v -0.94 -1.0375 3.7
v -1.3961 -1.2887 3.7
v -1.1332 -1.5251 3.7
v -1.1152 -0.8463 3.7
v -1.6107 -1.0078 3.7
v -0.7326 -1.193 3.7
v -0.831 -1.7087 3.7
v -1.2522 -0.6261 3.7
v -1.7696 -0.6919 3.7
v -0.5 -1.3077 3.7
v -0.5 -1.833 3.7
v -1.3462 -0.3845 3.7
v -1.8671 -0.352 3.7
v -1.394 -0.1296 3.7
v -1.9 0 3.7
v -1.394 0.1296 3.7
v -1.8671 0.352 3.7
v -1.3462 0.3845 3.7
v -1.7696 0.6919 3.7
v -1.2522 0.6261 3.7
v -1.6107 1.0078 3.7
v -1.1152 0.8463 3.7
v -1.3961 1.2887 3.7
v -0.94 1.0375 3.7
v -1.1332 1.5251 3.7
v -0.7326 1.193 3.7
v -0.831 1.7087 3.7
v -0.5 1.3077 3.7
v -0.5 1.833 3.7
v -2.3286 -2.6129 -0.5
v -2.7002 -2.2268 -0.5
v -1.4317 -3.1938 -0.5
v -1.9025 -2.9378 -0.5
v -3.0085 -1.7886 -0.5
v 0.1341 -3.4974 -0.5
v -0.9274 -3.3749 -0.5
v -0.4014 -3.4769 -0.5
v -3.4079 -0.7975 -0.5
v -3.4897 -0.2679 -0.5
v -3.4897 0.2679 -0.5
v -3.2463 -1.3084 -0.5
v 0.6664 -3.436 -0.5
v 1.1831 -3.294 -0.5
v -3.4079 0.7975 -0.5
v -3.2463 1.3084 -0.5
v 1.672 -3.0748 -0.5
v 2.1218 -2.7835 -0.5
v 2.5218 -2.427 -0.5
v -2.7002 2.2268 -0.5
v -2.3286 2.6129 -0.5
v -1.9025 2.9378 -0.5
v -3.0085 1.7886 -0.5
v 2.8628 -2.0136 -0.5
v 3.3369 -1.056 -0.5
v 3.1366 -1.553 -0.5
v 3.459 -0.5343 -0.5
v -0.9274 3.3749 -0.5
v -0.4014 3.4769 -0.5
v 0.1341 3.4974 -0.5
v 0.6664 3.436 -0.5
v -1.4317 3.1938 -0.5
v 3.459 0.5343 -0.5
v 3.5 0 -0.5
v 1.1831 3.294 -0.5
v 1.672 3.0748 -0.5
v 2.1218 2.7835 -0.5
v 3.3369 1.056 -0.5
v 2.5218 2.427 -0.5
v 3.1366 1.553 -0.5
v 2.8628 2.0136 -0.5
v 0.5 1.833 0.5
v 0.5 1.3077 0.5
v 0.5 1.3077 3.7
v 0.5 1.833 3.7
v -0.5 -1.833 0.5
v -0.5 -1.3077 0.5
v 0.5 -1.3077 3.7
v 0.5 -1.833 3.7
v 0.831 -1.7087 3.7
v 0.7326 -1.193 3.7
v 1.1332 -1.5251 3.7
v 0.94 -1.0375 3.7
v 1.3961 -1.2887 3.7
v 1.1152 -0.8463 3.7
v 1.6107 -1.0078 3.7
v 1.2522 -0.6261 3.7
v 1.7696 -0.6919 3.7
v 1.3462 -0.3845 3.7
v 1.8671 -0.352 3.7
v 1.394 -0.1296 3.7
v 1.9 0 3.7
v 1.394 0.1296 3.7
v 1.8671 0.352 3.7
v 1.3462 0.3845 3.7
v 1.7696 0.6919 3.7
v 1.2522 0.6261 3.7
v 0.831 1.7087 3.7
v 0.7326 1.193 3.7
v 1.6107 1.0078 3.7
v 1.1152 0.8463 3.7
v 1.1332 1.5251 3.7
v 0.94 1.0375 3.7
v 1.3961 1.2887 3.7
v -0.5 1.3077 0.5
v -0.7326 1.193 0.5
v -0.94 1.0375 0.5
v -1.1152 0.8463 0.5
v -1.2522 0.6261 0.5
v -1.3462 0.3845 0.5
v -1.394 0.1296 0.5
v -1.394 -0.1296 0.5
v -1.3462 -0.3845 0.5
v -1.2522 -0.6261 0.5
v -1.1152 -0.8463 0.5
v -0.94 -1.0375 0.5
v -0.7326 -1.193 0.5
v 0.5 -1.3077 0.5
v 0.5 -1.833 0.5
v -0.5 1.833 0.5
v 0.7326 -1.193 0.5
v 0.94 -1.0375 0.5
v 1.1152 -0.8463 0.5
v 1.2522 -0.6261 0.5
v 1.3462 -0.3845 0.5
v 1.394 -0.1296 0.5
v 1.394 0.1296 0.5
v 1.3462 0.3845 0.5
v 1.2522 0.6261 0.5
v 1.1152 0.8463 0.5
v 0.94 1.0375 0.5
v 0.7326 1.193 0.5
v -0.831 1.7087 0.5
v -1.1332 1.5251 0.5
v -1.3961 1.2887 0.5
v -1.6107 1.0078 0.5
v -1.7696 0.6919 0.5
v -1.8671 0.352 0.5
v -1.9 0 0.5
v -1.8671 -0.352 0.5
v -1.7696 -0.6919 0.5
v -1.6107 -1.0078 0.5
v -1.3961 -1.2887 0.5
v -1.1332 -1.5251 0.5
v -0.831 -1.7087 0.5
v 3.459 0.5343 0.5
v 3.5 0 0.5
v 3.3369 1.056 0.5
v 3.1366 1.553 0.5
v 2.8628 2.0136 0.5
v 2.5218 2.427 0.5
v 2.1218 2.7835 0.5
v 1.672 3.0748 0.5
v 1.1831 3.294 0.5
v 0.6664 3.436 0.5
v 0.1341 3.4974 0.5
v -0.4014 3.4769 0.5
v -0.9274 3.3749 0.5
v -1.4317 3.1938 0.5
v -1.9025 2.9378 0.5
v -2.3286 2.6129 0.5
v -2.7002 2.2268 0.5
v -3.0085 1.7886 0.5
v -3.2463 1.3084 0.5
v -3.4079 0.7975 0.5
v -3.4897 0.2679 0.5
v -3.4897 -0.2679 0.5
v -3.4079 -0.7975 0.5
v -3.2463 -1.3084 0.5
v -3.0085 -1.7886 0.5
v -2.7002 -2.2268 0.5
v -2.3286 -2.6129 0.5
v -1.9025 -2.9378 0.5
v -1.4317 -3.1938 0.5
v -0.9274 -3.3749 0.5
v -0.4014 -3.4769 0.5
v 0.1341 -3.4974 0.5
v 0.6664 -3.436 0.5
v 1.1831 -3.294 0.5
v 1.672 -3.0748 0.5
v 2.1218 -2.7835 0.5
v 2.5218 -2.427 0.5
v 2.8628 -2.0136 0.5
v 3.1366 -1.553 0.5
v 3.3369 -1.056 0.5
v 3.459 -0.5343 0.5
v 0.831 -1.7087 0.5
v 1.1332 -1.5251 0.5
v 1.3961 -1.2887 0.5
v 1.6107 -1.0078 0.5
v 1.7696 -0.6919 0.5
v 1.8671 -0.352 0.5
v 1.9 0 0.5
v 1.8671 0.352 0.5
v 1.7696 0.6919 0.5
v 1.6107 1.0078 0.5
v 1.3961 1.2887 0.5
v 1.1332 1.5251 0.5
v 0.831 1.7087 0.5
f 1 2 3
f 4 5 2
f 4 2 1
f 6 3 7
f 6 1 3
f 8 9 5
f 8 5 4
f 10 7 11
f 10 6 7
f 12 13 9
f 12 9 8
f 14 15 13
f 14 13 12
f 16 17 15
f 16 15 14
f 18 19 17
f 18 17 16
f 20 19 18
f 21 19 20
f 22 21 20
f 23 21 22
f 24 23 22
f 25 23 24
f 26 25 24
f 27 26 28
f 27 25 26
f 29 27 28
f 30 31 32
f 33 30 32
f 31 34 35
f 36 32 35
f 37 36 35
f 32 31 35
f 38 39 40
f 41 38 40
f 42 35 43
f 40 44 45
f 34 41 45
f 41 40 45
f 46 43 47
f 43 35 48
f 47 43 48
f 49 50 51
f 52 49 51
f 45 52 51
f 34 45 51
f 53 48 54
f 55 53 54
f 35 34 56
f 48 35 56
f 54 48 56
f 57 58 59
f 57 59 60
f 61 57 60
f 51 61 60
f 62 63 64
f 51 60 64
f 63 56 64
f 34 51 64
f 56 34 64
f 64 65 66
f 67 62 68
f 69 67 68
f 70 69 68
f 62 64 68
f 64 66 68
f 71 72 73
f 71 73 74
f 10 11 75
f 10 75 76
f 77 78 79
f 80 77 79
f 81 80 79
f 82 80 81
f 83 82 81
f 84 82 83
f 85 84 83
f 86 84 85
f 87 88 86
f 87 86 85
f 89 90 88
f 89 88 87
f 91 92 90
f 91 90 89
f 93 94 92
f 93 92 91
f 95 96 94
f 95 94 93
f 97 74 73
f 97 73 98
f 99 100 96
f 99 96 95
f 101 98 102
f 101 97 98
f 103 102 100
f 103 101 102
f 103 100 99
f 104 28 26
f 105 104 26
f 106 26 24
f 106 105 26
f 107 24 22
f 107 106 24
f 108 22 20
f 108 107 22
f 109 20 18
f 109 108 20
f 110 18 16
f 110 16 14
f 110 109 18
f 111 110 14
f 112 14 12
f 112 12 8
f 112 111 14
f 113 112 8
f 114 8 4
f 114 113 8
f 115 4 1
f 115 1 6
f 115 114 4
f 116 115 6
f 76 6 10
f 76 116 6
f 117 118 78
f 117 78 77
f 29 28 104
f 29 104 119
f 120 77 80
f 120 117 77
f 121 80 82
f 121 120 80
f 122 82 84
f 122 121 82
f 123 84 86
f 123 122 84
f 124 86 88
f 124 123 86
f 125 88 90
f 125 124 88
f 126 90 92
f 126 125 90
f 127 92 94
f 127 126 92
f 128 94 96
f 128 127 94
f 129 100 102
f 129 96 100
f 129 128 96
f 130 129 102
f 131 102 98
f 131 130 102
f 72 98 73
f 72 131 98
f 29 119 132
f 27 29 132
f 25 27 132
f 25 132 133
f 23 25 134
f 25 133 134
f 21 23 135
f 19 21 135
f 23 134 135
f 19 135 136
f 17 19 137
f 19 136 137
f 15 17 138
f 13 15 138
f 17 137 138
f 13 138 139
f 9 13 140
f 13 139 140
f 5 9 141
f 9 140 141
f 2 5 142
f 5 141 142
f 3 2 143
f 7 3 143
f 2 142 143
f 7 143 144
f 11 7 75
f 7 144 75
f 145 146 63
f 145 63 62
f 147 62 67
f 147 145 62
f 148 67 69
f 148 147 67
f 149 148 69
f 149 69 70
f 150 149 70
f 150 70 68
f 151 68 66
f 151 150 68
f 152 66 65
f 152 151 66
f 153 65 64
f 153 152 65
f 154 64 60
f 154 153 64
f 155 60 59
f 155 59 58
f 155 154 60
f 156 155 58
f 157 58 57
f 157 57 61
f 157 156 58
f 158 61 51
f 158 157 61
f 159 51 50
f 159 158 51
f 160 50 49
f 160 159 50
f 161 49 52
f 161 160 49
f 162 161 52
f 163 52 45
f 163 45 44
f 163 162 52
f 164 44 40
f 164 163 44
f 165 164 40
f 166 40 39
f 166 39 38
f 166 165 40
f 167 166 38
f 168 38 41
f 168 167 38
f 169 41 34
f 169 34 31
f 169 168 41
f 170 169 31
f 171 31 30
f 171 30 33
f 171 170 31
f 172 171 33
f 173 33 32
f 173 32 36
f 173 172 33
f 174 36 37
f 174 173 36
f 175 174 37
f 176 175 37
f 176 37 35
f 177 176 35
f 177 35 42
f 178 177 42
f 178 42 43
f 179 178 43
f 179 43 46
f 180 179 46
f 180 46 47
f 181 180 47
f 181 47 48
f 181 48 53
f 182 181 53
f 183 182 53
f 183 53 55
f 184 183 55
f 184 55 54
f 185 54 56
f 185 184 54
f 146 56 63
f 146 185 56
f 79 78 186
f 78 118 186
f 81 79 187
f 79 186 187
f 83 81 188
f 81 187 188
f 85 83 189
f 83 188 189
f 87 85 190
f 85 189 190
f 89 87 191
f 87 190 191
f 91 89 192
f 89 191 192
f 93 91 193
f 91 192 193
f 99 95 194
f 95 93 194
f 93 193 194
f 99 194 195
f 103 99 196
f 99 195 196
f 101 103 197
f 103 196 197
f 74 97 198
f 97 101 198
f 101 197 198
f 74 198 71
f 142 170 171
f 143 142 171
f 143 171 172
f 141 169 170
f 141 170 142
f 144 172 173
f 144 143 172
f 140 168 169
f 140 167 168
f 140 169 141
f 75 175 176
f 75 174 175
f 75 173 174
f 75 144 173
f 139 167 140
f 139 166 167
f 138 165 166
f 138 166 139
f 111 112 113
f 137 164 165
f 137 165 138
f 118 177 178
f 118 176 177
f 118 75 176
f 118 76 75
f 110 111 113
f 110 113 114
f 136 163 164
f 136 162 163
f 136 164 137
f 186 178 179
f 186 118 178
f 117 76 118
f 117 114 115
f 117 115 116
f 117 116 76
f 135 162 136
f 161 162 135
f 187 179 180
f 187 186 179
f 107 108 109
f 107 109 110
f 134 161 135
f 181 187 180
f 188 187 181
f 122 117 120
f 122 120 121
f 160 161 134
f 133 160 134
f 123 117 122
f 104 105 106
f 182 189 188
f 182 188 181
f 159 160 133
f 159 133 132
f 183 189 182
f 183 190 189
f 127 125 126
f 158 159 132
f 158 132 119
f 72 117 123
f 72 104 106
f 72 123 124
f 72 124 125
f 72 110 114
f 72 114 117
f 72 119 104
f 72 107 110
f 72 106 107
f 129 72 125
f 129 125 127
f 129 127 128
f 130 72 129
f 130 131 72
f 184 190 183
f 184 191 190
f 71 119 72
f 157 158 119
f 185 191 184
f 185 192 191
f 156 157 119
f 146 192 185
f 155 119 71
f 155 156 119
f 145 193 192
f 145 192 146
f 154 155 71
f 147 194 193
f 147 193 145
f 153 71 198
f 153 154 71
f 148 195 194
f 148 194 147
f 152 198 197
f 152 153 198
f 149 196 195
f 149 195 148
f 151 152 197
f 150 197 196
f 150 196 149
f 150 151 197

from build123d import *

# Parameters (mm, degrees)
F0_R     = 3.5
F1_DEPTH = 0.5
F2_R     = 1.9
F2_R_2   = 1.4
F3_DEPTH = 3.2
F4_W     = 1
F4_H     = 6.460969
F5_DEPTH = 3.2


with BuildPart() as f1:
    # F0 (on Top) → F1 (new body, symmetric)
    with BuildSketch(Plane.XY):
        Circle(F0_R)
    extrude(amount=F1_DEPTH, both=True)

    # F2 (on face) → F3 (join)
    with BuildSketch(Plane.XY.offset(0.5)):
        Circle(F2_R)
        Circle(F2_R_2, mode=Mode.SUBTRACT)
    extrude(amount=F3_DEPTH)

    # F4 (on face) → F5 (cut, through all)
    with BuildSketch(Plane.XY.offset(3.7)):
        with Locations((0, -0.287181)):
            Rectangle(F4_W, F4_H)
    extrude(amount=-F5_DEPTH, mode=Mode.SUBTRACT)


solid = f1.part
